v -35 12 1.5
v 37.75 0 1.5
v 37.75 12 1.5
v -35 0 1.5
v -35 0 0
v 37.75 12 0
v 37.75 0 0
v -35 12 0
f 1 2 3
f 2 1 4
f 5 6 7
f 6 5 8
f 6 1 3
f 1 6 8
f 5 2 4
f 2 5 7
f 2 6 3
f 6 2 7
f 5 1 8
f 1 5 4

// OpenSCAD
// 10-well agarose gel comb - flat plate with spine and hanging teeth.
// Orientation: Lying flat on XY plane, spine along X, teeth hanging in -Y.

// Dimensions
spine_len = 70;
spine_w   = 12;
plate_thk = 1.5;

tooth_w   = 5.0;
tooth_l   = 12;
tooth_gap = 1.5;
n_teeth   = 10;

$fn = 64;

// Calculate total width of the tooth row
tooth_row_w = n_teeth * tooth_w + (n_teeth - 1) * tooth_gap;

// Calculate position of the tooth row relative to the spine edge
// The teeth hang from the -Y edge of the spine.
// We define the spine as a block from Y=0 to Y=spine_w.
// The teeth start at Y=0 and extend to Y=-tooth_l.
// The tooth row is centred on the spine in X.

module comb() {
    // 1. The Spine (Back Bar)
    // Dimensions: spine_len x spine_w x plate_thk
    // Position: Centred in X, sitting on Z=0.
    // Y range: 0 to spine_w (teeth hang from Y=0)
    translate([-spine_len / 2, 0, 0])
        cube([spine_len, spine_w, plate_thk]);

    // 2. The Teeth
    // We generate the positions for the teeth.
    // The row is centred on the spine in X.
    // The row starts at Y=0 and goes to Y=-tooth_l.
    
    // Calculate the X offset to centre the row on the spine
    spine_half_w = spine_w / 2;
    row_half_w   = tooth_row_w / 2;
    x_offset     = spine_half_w - row_half_w;

    // Generate tooth positions
    // i goes from 0 to n_teeth - 1
    // Position in X: x_offset + i * (tooth_w + tooth_gap)
    // Position in Y: 0 (top of tooth) to -tooth_l (bottom)
    
    for (i = [0 : n_teeth - 1]) {
        tx = x_offset + i * (tooth_w + tooth_gap);
        ty = 0;
        tz = 0;
        
        translate([tx, ty, tz])
            cube([tooth_w, tooth_l, plate_thk]);
    }
}

comb();
